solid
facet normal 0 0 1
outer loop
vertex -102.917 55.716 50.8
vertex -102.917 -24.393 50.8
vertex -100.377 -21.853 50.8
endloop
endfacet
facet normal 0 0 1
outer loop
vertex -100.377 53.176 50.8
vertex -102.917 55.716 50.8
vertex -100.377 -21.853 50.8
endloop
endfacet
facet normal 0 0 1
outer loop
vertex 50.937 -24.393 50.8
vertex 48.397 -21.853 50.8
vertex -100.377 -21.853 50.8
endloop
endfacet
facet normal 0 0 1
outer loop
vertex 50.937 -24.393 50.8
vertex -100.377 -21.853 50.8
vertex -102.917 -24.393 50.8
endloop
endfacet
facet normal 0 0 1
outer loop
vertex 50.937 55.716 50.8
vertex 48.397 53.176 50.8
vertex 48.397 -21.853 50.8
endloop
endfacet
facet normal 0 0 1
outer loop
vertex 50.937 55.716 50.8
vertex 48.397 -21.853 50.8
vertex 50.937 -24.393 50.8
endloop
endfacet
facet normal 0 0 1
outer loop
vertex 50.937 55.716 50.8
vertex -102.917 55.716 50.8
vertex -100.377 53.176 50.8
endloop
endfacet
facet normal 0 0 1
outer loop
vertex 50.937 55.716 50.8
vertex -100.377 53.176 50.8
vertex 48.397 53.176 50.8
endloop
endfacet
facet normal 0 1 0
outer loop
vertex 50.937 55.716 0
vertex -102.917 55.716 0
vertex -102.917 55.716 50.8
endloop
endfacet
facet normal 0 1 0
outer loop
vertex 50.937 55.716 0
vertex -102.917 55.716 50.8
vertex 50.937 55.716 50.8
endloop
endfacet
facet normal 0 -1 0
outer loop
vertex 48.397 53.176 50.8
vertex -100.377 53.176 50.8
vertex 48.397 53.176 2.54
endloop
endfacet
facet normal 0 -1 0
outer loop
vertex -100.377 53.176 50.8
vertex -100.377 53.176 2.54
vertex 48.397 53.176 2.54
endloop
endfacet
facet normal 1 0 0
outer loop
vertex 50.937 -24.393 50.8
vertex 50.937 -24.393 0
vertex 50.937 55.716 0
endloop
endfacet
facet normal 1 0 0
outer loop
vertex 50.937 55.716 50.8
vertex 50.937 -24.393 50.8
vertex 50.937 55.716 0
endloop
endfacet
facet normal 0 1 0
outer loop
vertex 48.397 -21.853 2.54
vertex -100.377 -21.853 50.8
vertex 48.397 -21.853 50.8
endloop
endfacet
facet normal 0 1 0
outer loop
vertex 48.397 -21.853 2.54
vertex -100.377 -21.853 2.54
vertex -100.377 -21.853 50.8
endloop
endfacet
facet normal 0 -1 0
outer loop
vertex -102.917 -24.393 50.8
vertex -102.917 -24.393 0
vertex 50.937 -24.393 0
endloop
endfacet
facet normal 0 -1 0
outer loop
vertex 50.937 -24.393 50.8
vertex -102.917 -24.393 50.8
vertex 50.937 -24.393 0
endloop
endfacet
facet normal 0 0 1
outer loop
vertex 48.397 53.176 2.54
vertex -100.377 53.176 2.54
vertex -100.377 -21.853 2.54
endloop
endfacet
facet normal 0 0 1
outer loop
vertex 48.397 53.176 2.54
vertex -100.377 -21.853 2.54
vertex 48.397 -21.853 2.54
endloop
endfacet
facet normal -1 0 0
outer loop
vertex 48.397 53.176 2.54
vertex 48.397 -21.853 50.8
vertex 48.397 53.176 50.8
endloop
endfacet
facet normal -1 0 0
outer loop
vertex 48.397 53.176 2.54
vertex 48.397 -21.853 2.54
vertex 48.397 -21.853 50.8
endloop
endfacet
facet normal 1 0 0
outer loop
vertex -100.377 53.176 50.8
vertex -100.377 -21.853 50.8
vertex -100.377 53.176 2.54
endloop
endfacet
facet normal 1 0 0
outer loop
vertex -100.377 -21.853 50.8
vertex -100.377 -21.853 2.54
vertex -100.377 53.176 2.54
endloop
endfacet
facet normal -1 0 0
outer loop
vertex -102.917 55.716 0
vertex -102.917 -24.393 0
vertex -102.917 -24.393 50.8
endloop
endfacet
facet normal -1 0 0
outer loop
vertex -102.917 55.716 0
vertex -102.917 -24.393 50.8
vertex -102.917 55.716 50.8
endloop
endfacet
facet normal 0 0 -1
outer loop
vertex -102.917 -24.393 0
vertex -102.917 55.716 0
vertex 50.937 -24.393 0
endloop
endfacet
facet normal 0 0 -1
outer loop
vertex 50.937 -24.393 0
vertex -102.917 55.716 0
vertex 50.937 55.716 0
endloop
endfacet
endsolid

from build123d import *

# Parameters (mm, degrees)
F0_W     = 153.853889
F0_H     = 80.108998
F1_DEPTH = 50.8
F2_W     = 126.011554
F2_H     = 47.126646
F3_DEPTH = 25.4
F4_DEPTH = 25.4
F5_T     = -2.54


with BuildPart() as f1:
    # F0 (on Top) → F1 (new body)
    with BuildSketch(Plane.XY):
        with Locations((-25.98972, 15.661658)):
            Rectangle(F0_W, F0_H)
    extrude(amount=F1_DEPTH)

    # F2 (on face) → F3 (join)
    with BuildSketch(Plane.XY.offset(50.8)):
        with Locations((-26.755249, 16.175097)):
            Rectangle(F2_W, F2_H)
    extrude(amount=-F3_DEPTH)

    # F2 (on face) → F4 (join)
    with BuildSketch(Plane.XY.offset(50.8)):
        with Locations((-26.755249, 16.175097)):
            Rectangle(F2_W, F2_H)
    extrude(amount=-F4_DEPTH)

    # F5
    f5_openings = [f1.faces().sort_by_distance(p)[0] for p in [
        (-25.989721, 15.661658, 50.8),
    ]]
    offset(amount=F5_T, openings=f5_openings)


solid = f1.part
